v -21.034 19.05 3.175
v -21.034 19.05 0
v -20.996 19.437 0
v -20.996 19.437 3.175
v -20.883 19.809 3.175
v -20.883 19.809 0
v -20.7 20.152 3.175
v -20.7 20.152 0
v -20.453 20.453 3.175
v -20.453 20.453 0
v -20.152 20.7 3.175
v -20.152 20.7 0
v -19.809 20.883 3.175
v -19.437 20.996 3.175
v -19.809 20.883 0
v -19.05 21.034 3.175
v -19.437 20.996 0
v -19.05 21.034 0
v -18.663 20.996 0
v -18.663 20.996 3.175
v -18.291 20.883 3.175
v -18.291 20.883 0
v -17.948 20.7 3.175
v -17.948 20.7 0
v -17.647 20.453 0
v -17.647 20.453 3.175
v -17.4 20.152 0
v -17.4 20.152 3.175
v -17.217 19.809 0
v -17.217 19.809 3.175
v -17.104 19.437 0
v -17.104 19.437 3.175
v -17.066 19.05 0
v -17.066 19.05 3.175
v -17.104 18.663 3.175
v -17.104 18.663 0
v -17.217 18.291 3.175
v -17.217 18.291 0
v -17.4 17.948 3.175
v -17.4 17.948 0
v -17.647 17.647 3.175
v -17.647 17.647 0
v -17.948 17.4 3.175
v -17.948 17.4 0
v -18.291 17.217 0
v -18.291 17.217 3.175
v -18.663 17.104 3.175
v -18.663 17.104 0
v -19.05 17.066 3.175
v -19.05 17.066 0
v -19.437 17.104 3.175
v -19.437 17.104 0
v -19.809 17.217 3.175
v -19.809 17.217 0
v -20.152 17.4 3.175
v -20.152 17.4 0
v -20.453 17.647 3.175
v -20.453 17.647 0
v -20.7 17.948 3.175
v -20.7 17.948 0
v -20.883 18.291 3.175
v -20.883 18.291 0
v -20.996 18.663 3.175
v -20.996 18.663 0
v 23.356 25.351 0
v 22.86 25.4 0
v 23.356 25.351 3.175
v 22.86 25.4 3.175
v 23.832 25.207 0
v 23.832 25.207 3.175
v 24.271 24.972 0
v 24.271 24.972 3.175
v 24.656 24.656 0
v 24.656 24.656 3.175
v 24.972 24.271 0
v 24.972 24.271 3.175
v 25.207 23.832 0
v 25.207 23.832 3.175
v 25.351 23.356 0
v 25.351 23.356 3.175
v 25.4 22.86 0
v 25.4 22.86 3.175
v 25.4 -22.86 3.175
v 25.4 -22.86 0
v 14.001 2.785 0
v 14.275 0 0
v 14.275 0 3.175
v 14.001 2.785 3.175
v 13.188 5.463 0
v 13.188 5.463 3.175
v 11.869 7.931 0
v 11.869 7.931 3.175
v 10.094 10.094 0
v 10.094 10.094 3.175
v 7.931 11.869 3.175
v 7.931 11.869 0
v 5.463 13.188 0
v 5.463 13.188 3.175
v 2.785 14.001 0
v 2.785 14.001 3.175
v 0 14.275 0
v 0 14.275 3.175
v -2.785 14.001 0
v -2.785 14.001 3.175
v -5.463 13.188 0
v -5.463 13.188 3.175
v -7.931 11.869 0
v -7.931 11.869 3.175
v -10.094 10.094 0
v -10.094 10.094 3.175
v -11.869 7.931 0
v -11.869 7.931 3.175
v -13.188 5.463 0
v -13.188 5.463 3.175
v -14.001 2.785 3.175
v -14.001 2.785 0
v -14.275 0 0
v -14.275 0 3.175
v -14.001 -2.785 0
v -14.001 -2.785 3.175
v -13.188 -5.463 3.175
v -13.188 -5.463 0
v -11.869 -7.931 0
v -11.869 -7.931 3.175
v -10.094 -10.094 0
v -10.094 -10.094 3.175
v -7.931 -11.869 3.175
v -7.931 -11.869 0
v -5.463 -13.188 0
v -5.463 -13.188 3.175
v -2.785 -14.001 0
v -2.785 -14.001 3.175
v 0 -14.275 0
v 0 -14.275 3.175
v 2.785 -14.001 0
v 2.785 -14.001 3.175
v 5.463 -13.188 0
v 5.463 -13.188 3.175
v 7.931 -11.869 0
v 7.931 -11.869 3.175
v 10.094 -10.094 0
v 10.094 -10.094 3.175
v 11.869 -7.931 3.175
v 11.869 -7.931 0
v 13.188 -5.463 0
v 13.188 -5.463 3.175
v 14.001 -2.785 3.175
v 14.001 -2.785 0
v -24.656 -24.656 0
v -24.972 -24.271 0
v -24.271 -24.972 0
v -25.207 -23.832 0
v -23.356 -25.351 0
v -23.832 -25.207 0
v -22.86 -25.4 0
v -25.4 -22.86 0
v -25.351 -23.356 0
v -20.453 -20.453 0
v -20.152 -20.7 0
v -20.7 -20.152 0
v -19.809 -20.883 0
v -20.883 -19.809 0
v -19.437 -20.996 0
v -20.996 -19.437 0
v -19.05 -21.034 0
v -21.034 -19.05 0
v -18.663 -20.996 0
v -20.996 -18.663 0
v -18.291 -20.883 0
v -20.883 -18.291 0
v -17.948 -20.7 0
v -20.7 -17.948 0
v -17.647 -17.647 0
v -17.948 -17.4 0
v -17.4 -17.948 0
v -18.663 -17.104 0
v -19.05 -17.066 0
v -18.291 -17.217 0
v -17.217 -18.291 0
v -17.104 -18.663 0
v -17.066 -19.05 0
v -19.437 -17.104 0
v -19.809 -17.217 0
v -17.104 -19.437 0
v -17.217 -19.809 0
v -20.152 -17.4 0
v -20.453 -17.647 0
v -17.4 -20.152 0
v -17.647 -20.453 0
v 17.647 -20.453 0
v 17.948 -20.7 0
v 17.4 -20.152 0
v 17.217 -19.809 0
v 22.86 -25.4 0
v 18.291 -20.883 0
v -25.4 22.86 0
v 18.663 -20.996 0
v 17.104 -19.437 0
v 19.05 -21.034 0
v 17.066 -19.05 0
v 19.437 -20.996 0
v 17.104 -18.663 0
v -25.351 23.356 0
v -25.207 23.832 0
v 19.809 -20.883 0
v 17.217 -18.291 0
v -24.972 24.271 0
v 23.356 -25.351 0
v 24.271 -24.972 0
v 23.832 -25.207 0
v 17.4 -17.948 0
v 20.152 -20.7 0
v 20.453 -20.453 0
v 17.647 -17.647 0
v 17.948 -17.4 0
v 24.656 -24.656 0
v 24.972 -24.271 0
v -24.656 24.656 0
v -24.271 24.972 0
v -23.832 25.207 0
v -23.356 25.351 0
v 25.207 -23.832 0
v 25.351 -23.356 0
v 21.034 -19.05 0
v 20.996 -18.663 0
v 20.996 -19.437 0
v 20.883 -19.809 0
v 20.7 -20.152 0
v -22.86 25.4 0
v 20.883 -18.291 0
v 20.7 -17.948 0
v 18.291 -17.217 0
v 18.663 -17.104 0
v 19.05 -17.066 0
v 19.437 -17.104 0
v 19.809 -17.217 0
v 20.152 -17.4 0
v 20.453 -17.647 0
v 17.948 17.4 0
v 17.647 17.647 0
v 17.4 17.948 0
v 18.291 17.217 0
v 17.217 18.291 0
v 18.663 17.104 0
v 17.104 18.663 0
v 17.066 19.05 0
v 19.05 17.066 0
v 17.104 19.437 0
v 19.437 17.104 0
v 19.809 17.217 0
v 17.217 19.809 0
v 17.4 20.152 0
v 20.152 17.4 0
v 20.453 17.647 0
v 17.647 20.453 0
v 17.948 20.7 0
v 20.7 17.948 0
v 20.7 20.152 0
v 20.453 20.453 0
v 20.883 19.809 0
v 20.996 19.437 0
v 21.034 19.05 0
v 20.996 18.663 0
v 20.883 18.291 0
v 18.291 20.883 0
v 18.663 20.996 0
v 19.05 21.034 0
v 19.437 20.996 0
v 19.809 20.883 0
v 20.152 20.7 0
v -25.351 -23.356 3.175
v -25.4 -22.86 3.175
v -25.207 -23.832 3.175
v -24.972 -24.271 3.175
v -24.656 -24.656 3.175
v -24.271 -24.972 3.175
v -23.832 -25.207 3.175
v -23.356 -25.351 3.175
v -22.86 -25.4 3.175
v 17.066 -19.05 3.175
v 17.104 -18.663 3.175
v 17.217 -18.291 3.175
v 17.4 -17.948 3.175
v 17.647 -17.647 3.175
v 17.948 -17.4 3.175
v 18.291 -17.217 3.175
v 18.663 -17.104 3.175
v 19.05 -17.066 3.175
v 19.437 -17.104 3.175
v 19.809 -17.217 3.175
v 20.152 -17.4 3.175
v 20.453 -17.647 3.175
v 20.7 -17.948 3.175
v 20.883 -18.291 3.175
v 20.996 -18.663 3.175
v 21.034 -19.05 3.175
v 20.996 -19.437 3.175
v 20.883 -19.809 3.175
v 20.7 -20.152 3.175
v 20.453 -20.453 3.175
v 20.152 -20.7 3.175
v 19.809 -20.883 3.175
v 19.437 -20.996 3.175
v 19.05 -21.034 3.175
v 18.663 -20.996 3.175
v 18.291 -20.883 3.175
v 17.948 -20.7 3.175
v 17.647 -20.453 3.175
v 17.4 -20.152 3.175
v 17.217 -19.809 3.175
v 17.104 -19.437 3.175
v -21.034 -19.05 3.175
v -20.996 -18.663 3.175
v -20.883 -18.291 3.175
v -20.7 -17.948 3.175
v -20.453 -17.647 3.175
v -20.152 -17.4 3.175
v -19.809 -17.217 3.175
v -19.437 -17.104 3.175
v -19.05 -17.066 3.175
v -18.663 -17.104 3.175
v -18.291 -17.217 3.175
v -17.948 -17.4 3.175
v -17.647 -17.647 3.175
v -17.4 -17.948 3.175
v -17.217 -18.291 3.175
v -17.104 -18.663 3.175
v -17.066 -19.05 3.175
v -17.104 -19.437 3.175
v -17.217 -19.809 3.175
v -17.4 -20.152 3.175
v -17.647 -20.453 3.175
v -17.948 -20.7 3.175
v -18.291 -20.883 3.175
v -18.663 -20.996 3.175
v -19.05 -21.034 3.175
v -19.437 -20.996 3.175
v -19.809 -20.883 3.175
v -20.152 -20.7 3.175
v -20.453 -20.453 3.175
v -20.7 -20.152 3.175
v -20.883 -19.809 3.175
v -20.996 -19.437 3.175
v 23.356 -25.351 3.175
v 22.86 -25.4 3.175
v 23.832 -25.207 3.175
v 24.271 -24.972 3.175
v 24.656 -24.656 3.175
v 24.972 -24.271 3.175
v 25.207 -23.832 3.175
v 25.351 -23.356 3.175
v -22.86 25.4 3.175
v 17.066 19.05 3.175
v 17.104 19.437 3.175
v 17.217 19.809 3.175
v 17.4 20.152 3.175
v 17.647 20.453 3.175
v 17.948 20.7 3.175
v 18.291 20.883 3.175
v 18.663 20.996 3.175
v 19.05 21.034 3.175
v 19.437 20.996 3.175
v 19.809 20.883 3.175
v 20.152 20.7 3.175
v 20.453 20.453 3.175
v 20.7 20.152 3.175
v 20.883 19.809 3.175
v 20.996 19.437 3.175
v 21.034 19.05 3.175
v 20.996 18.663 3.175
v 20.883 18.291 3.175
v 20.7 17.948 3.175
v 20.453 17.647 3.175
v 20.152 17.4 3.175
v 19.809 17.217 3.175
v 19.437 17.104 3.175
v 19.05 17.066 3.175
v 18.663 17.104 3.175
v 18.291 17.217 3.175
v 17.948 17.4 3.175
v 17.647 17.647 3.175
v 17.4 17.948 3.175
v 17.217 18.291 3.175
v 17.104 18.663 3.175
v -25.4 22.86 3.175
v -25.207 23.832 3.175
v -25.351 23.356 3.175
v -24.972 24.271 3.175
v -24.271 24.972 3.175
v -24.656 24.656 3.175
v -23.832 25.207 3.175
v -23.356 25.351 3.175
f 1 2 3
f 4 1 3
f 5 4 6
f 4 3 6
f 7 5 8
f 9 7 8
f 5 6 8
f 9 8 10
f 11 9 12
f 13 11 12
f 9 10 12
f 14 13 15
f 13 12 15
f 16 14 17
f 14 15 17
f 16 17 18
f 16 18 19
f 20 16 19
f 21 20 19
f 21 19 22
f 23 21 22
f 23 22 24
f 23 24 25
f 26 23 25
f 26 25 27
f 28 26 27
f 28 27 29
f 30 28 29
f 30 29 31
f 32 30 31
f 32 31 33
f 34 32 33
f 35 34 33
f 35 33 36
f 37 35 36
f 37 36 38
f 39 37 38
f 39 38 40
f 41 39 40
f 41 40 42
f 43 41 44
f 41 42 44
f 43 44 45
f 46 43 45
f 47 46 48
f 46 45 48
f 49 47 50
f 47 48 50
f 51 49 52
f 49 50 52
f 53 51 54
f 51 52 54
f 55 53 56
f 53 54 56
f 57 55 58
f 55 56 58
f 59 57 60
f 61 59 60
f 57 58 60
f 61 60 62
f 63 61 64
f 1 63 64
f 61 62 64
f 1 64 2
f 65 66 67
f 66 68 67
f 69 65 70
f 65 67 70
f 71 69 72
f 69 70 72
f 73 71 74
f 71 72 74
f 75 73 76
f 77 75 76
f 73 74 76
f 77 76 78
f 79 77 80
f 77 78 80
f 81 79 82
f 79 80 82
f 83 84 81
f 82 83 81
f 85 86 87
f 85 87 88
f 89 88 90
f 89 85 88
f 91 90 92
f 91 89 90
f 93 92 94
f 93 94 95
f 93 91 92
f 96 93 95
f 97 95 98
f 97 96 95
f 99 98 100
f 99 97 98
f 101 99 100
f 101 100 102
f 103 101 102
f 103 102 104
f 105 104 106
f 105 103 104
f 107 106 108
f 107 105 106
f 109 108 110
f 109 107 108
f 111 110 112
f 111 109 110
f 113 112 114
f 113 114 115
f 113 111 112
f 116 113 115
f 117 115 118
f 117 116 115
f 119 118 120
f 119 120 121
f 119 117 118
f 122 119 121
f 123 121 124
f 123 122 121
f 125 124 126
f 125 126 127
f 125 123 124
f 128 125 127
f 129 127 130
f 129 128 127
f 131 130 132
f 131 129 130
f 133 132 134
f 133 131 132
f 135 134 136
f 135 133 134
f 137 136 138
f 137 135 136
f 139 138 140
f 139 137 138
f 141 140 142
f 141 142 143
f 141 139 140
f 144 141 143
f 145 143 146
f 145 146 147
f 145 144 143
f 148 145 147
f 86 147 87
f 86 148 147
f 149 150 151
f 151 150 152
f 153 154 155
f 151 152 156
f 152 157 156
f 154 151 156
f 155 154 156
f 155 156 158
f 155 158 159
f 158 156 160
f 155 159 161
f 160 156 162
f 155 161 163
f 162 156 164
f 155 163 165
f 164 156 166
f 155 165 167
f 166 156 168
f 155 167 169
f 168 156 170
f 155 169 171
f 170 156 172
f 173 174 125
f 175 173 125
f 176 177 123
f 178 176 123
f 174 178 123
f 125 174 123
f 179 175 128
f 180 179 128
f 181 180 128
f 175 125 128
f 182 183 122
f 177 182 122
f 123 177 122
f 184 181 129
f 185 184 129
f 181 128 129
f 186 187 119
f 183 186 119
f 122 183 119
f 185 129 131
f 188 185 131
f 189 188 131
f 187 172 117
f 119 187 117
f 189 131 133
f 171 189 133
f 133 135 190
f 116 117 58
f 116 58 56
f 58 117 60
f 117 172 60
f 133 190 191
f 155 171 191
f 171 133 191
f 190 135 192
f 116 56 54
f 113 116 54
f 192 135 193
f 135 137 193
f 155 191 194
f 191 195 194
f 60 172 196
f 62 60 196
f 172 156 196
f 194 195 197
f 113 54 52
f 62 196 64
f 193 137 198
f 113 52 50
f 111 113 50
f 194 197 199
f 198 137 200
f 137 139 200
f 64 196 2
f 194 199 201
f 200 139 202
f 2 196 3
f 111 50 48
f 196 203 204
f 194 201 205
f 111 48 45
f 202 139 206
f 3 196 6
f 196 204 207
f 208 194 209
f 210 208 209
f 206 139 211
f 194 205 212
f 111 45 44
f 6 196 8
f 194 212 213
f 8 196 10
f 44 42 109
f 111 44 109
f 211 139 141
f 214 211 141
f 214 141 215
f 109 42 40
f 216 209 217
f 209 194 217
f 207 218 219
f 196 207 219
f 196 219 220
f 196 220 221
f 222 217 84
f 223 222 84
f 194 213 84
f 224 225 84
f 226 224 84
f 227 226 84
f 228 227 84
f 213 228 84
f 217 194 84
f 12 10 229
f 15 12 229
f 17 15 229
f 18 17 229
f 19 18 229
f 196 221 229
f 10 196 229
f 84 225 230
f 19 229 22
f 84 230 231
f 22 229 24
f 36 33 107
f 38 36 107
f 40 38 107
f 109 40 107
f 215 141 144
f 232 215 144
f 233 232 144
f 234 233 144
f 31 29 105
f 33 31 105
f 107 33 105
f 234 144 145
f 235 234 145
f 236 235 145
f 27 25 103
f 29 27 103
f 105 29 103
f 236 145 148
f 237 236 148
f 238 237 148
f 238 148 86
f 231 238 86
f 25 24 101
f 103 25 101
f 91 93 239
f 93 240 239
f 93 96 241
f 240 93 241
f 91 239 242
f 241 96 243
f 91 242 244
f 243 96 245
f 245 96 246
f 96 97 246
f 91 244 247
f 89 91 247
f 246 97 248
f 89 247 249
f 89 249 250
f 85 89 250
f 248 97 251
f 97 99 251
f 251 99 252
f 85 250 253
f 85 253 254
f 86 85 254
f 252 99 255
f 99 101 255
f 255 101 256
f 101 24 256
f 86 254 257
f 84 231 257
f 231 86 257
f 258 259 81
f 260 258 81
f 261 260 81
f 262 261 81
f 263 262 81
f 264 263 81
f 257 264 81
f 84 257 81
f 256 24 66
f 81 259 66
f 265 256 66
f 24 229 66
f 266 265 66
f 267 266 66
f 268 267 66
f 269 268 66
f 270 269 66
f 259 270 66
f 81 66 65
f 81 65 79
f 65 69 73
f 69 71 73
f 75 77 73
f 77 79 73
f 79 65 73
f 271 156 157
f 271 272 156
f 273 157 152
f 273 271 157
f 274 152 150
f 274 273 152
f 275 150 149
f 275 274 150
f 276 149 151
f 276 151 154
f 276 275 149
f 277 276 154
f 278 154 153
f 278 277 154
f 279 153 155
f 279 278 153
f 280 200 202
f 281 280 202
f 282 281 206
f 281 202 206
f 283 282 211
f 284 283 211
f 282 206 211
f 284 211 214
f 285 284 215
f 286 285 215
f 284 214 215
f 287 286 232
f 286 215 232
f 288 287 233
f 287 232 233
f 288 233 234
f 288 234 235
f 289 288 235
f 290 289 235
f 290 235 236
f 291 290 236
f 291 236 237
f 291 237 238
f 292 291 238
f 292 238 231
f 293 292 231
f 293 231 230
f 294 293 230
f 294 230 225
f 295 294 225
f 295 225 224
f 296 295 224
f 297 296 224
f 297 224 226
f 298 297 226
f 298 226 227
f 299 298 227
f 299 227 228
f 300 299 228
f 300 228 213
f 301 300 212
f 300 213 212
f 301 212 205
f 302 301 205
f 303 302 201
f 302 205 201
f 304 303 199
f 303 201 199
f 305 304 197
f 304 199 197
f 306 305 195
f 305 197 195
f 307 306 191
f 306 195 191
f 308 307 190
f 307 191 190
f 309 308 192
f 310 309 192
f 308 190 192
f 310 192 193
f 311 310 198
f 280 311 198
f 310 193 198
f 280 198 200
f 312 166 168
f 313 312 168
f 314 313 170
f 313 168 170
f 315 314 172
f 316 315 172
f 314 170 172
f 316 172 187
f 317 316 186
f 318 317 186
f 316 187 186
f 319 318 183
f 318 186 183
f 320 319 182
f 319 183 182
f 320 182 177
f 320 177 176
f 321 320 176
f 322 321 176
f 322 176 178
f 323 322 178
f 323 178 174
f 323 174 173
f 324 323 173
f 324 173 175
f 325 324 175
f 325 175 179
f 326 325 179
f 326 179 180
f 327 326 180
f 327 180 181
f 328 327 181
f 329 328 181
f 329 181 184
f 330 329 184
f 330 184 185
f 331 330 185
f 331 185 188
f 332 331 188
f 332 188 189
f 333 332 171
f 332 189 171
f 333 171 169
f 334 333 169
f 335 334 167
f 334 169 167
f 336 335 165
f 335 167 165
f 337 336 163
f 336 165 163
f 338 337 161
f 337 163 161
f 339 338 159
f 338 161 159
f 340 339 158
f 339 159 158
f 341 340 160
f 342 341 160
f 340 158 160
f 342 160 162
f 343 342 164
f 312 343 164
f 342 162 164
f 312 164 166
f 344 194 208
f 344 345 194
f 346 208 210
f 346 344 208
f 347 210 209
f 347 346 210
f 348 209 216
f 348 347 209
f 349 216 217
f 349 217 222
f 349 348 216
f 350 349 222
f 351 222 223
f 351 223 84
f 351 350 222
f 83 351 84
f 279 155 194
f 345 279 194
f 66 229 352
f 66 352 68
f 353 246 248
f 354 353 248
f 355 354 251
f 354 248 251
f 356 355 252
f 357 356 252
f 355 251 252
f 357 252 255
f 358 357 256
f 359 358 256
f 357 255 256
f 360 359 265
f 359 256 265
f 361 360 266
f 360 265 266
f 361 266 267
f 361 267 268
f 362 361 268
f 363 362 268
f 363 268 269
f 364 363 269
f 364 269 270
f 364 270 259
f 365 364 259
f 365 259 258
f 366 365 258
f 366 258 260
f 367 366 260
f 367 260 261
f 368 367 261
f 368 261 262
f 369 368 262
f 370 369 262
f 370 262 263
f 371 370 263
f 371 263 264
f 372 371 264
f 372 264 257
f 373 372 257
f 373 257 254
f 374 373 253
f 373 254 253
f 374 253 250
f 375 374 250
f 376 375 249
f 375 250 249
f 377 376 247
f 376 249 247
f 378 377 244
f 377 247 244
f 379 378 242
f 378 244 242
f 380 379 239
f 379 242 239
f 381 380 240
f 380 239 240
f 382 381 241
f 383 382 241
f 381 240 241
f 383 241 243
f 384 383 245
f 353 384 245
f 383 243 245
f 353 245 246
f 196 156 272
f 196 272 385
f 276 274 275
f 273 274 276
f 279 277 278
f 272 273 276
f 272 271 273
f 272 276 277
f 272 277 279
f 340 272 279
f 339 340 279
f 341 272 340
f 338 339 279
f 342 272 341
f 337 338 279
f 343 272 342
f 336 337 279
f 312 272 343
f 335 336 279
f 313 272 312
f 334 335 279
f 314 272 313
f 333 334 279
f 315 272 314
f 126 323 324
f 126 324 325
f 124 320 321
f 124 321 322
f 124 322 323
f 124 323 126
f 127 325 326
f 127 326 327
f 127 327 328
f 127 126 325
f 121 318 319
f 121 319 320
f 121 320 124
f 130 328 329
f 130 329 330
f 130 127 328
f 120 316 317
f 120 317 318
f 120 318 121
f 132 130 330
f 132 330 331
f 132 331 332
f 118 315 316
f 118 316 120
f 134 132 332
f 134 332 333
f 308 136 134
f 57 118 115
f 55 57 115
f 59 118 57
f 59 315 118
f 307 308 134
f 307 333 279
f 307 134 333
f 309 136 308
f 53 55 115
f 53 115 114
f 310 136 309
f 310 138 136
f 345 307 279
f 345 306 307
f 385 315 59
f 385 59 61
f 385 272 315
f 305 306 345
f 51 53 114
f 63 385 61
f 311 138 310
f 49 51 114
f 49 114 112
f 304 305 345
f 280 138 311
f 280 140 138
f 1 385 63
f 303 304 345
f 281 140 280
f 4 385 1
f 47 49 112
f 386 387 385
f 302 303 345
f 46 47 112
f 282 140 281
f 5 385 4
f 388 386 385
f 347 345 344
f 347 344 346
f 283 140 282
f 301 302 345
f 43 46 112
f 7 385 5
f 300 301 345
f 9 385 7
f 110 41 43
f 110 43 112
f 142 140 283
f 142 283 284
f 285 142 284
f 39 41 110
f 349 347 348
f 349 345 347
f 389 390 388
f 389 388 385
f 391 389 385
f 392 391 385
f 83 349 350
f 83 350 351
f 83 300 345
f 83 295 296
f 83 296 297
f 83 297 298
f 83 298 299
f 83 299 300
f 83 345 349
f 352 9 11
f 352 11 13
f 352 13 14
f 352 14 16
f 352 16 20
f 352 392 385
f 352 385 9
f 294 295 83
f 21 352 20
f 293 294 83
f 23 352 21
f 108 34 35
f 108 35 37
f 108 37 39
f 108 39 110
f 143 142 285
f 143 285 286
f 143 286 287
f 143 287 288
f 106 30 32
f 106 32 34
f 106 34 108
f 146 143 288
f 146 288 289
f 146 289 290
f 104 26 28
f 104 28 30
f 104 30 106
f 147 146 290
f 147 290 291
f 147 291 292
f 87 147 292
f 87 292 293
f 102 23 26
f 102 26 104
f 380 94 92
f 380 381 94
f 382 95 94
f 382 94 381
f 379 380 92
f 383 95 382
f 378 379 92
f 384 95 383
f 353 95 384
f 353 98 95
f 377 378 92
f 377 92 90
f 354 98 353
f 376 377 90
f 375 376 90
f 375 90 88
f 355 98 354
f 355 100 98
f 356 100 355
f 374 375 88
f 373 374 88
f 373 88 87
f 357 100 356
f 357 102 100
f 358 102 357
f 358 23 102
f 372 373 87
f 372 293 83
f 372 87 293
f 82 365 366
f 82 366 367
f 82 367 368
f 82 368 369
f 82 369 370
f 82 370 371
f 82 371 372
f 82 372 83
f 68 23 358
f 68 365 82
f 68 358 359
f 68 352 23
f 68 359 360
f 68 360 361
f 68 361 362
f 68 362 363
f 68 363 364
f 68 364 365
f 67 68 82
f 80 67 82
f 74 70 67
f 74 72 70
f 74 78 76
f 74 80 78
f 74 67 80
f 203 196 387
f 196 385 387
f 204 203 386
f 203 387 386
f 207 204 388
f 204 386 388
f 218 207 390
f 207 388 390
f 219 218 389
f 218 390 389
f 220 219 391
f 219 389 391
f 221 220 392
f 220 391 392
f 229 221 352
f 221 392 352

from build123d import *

# Parameters (mm, degrees)
SKETCH1_W                       = 50.8
SKETCH1_H                       = 50.8
SKETCH1_R                       = 14.2748
BOSS_EXTRUDE1_DEPTH             = 3.175
FILLET1_R                       = 2.54
F_5_32_0_15625_DIAMETER_HOLE1_D = 3.96875


with BuildPart() as part:
    # Sketch1 → Boss-Extrude1 (new body)
    with BuildSketch(Plane.XY):
        Rectangle(SKETCH1_W, SKETCH1_H)
        Circle(SKETCH1_R, mode=Mode.SUBTRACT)
    extrude(amount=BOSS_EXTRUDE1_DEPTH)

    # Fillet1
    fillet1_edges = [part.edges().sort_by_distance(p)[0] for p in [
        (-25.4, 25.4, 1.5875),
        (25.4, 25.4, 1.5875),
        (25.4, -25.4, 1.5875),
        (-25.4, -25.4, 1.5875),
    ]]
    fillet(fillet1_edges, radius=FILLET1_R)

    # 5/32 (0.15625) Diameter Hole1 (through all)
    with Locations(Plane.XY.offset(3.175)):
        with Locations((-19.05, 19.05), (19.05, 19.05), (19.05, -19.05), (-19.05, -19.05)):
            Hole(F_5_32_0_15625_DIAMETER_HOLE1_D / 2)


solid = part.part
